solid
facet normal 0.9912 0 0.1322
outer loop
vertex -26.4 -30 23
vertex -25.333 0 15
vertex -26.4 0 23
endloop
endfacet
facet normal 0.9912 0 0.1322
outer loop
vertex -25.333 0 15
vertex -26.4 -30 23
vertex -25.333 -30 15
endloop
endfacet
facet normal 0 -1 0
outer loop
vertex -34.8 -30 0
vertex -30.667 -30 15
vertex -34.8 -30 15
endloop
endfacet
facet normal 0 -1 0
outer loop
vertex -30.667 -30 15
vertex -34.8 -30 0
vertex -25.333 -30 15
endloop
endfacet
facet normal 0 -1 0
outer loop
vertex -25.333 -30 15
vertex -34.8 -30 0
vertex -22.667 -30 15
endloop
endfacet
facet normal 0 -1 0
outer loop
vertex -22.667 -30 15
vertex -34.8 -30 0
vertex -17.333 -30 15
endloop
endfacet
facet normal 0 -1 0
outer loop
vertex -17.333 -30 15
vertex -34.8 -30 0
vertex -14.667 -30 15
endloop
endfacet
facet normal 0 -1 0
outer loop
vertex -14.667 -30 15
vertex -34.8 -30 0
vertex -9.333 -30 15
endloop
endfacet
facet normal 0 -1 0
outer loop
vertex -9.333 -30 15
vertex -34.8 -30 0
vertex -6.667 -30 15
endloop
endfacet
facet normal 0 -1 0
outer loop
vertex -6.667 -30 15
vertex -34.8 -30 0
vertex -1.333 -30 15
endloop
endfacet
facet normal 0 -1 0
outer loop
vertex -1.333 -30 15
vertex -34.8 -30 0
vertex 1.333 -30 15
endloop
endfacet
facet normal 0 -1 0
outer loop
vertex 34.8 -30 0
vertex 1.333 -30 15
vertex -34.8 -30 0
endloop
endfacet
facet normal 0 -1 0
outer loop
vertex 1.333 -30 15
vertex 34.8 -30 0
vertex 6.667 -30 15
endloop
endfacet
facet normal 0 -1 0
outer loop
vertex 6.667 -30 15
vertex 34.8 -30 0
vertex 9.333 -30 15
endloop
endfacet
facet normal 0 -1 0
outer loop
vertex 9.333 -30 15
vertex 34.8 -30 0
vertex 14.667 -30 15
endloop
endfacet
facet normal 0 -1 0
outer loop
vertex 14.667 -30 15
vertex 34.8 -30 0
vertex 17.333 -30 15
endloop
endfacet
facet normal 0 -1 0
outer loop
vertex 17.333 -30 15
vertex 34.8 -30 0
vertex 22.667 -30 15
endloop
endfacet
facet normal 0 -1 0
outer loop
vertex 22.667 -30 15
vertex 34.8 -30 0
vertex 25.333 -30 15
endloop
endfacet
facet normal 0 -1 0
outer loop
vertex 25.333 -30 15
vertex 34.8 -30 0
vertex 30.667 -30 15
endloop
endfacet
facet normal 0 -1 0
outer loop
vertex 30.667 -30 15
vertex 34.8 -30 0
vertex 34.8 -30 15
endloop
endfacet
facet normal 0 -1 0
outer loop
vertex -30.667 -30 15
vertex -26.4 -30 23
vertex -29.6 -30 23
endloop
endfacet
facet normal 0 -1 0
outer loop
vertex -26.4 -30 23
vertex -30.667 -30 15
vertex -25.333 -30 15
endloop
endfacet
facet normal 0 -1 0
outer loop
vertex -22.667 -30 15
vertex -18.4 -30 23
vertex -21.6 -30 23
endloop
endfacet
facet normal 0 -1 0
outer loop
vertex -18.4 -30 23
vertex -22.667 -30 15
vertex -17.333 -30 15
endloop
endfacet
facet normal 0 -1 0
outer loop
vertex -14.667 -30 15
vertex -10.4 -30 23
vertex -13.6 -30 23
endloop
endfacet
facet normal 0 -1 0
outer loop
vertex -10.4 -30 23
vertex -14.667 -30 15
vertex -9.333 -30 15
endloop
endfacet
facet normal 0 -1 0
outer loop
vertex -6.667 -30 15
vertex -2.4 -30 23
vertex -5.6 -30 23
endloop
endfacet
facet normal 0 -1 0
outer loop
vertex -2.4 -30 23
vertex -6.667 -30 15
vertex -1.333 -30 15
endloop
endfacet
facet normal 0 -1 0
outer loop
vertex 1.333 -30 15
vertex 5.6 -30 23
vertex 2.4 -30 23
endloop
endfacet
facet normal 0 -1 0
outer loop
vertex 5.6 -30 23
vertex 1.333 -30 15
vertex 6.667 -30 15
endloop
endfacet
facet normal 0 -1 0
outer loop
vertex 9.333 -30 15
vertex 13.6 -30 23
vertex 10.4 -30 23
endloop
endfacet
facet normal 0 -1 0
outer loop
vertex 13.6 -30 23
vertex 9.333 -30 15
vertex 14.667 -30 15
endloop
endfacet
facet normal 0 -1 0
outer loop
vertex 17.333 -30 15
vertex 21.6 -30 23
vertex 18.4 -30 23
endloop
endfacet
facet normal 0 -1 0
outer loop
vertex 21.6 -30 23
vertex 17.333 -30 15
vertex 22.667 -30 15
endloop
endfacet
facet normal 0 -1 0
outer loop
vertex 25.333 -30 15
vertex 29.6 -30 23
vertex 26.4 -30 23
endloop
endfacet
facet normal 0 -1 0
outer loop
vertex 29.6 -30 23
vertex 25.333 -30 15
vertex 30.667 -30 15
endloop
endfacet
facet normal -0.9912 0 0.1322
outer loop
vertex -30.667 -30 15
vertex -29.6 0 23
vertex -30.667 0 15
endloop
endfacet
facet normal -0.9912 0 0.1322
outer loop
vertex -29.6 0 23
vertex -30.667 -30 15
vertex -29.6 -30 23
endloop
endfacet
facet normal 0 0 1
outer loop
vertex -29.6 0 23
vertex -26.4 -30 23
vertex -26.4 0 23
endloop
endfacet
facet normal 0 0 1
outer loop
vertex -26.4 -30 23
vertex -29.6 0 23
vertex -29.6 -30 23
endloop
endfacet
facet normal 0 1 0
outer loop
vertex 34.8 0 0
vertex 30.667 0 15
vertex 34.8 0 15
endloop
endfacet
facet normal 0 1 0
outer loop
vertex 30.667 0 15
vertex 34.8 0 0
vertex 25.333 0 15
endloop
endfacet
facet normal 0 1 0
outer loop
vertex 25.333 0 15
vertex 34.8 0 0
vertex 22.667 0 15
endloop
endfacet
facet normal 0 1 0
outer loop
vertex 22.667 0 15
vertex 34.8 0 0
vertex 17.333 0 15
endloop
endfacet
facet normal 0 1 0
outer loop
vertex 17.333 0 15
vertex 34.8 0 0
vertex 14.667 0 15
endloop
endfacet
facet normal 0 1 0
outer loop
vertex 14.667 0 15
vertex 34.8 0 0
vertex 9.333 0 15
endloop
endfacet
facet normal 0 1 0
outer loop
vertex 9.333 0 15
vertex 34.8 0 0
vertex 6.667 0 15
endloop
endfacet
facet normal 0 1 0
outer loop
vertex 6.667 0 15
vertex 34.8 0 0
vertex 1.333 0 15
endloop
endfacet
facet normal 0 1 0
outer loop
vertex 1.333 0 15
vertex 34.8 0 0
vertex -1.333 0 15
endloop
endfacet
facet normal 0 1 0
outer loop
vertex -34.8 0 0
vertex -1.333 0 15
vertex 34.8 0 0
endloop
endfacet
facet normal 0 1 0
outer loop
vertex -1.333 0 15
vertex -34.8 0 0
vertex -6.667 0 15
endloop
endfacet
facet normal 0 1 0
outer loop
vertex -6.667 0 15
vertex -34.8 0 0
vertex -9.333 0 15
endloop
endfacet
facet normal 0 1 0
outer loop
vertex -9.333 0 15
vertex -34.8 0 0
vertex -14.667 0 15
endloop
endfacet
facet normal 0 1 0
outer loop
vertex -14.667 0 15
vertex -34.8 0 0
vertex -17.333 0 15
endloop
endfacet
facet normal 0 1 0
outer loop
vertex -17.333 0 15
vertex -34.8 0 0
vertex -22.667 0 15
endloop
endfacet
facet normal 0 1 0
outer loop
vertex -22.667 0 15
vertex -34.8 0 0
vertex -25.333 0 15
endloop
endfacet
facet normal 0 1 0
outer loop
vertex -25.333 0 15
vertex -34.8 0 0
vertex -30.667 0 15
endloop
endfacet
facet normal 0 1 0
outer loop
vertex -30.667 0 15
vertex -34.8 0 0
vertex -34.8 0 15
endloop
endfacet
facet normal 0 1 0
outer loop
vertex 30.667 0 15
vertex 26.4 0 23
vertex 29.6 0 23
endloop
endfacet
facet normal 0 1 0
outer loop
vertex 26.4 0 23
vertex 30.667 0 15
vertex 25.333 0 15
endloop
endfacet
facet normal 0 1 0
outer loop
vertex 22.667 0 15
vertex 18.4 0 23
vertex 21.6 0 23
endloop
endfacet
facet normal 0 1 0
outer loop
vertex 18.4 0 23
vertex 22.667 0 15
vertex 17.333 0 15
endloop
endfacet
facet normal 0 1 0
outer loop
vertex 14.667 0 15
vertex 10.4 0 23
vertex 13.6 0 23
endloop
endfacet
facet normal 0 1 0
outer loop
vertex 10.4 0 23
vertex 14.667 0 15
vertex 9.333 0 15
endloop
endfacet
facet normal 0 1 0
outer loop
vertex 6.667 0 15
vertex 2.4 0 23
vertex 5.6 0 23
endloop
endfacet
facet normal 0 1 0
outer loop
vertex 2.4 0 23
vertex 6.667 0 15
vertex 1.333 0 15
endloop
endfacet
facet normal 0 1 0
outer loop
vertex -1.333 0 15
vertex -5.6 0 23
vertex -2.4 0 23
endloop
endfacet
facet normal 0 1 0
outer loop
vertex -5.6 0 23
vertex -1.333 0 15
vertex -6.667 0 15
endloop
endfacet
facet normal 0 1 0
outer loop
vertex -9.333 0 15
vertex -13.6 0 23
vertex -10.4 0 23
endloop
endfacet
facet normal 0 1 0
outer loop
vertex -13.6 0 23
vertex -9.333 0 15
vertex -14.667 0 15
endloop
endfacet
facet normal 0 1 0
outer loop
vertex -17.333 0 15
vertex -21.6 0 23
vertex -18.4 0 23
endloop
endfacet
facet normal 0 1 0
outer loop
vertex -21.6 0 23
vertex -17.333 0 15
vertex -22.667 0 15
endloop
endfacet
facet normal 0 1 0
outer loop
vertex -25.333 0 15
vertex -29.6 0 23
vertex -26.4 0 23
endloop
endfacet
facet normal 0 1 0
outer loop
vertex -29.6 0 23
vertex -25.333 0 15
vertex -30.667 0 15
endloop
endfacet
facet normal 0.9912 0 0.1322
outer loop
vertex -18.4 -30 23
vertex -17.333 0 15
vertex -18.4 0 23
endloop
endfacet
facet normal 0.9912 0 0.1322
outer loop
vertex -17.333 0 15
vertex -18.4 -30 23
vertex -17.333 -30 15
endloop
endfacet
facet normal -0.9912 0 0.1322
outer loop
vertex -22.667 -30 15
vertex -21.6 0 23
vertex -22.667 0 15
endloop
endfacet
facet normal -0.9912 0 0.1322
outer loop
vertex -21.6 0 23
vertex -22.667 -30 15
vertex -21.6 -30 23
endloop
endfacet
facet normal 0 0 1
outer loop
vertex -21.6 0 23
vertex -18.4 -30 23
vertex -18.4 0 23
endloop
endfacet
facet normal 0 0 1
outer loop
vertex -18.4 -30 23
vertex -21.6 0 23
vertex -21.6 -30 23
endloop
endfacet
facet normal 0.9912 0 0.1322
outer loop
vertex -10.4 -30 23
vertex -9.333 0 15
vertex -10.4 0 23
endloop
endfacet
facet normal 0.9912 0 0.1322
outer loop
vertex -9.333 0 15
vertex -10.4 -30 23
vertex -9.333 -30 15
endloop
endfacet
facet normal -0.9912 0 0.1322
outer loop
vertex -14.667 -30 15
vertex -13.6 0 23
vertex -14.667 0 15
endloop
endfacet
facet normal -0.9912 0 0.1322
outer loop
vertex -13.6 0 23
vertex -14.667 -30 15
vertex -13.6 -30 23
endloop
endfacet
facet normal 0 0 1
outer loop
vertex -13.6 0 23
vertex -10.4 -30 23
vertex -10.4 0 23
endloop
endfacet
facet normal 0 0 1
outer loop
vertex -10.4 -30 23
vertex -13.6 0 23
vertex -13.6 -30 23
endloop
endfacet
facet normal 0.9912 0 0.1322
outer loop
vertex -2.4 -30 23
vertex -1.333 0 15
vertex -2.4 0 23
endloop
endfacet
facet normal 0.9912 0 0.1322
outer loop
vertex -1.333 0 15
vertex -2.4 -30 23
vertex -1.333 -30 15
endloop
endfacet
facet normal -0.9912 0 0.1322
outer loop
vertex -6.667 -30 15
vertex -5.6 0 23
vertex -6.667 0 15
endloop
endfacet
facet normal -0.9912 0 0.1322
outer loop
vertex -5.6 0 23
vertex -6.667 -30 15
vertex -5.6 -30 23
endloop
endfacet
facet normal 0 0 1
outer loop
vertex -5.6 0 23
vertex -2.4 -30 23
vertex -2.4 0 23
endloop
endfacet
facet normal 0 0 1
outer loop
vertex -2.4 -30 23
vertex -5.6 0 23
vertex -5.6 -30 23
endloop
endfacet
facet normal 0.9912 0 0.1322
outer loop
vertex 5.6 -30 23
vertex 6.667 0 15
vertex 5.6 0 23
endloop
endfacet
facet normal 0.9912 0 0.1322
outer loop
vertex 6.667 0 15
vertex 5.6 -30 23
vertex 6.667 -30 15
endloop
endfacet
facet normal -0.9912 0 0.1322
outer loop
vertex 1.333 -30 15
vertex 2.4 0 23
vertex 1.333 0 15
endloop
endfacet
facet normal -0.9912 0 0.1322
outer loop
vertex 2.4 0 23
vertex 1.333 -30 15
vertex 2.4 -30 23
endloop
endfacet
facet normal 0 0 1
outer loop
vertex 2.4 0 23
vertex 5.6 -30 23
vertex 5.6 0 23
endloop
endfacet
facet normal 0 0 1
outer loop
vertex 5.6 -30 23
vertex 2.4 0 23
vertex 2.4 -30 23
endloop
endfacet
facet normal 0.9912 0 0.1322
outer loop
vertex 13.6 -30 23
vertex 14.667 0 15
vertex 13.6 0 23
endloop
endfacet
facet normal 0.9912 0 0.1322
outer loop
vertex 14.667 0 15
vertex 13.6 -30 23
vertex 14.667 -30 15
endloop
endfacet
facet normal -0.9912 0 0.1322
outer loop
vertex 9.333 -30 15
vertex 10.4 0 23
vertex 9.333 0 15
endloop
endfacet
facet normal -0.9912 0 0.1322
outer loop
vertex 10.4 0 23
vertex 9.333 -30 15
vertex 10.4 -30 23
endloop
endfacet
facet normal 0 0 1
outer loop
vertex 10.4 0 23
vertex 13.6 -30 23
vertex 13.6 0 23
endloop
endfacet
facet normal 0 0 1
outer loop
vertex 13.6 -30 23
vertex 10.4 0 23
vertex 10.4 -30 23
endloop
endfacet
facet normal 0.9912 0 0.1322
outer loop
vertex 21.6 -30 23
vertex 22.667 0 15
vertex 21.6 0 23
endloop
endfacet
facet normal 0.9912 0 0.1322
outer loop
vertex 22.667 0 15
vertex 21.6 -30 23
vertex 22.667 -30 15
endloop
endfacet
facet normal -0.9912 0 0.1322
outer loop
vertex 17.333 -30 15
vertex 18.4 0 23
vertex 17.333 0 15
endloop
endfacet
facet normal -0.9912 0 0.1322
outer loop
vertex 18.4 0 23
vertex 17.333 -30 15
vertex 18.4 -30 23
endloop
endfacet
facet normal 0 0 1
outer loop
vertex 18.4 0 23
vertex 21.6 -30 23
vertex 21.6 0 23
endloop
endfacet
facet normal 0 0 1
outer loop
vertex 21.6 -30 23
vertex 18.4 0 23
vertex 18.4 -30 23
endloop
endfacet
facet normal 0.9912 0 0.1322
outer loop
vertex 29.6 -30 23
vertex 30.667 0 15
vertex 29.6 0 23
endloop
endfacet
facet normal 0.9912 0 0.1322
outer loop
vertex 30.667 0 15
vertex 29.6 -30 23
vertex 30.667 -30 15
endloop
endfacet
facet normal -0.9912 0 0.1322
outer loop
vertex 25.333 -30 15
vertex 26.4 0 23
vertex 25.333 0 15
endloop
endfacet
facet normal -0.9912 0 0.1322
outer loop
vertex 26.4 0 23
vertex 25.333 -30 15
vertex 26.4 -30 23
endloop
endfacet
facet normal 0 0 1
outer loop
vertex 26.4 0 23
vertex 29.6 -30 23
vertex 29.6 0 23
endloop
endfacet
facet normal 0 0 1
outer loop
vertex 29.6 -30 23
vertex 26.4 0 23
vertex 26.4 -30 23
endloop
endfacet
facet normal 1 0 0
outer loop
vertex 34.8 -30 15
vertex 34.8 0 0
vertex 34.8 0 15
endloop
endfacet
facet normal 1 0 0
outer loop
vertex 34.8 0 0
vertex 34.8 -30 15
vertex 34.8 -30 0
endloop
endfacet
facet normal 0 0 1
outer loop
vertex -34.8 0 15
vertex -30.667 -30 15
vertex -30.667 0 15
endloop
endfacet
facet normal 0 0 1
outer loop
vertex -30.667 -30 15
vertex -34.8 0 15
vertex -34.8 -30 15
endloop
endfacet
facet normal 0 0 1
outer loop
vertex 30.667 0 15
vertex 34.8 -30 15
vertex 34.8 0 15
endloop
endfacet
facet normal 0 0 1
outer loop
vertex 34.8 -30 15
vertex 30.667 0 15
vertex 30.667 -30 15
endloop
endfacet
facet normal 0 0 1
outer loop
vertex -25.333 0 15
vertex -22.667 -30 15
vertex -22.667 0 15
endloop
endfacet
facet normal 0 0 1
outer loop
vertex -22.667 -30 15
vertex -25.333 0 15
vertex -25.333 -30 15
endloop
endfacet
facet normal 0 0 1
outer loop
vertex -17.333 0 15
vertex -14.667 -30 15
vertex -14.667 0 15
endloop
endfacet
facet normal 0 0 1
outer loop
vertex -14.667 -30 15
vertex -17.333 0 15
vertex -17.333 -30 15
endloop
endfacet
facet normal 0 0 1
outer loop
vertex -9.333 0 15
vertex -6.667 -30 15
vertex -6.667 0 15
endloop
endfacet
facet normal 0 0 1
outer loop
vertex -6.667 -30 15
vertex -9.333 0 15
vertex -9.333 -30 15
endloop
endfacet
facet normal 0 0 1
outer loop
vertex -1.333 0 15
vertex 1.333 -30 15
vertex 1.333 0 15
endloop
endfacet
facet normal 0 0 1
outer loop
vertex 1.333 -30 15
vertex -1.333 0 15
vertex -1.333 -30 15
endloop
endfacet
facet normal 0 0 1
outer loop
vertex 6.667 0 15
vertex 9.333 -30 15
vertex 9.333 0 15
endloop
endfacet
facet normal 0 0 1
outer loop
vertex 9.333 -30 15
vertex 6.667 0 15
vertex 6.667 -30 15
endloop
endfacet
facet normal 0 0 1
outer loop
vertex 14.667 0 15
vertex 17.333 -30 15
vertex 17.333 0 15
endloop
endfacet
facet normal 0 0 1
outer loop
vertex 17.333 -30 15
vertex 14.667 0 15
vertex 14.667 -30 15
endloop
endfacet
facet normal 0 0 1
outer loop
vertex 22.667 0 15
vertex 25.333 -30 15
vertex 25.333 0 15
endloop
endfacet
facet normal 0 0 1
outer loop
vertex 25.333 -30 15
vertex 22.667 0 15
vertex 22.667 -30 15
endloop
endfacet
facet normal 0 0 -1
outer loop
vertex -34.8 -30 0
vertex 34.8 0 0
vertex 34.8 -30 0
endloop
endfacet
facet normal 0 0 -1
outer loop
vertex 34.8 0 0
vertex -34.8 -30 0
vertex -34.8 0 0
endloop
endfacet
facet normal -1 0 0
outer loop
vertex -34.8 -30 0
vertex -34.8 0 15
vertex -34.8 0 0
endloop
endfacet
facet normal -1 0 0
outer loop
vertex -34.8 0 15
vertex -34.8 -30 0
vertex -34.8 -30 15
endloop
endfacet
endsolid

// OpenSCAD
$fn = 32;

// ----------------------------------------------------------------------
// Toothed rack, 8 teeth
// 8 mm pitch, 8 mm teeth
// ----------------------------------------------------------------------

// --- parameters (mm) ---
bar_w = 30;     // bar width (Y)
bar_h = 15;     // bar height (Z)
teeth = 8;      // number of teeth
pitch = 8;      // tooth pitch
tooth_h = 8;    // tooth height above the bar
root_w = 5.6;   // tooth width at the root
crest_w = 3.2;  // tooth width at the crest

// --- derived feature positions (mm) ---
span = (teeth - 1) * pitch;  // = 56   distance between the outer teeth
bar_l = span + root_w + 8;   // = 69.6   bar length: teeth plus 4 mm at each end
tooth_x = -span / 2;         // = -28   X of the first tooth
height = bar_h + tooth_h;    // = 23   overall height
feature_centers = [
  [tooth_x + 0 * pitch, -bar_w / 2],
  [tooth_x + 1 * pitch, -bar_w / 2],
  [tooth_x + 2 * pitch, -bar_w / 2],
  [tooth_x + 3 * pitch, -bar_w / 2],
  [tooth_x + 4 * pitch, -bar_w / 2],
  [tooth_x + 5 * pitch, -bar_w / 2],
  [tooth_x + 6 * pitch, -bar_w / 2],
  [tooth_x + 7 * pitch, -bar_w / 2]
];   // tooth centre line, drives the tooth loop

// bar with a rack of teeth, one extruded trapezoium per centre
module rack_tooth() {
  linear_extrude(height = bar_w)
    polygon(points = [
      [0, 0],
      [root_w, 0],
      [root_w / 2 + crest_w / 2, tooth_h + 1],
      [root_w / 2 - crest_w / 2, tooth_h + 1]
    ]);
}

union() {
  translate([-bar_l / 2, -bar_w, 0]) cube([bar_l, bar_w, bar_h]);
  for (centre = feature_centers)
    translate([centre[0] - root_w / 2, 0, bar_h - 1]) rotate([90, 0, 0]) rack_tooth();
}
